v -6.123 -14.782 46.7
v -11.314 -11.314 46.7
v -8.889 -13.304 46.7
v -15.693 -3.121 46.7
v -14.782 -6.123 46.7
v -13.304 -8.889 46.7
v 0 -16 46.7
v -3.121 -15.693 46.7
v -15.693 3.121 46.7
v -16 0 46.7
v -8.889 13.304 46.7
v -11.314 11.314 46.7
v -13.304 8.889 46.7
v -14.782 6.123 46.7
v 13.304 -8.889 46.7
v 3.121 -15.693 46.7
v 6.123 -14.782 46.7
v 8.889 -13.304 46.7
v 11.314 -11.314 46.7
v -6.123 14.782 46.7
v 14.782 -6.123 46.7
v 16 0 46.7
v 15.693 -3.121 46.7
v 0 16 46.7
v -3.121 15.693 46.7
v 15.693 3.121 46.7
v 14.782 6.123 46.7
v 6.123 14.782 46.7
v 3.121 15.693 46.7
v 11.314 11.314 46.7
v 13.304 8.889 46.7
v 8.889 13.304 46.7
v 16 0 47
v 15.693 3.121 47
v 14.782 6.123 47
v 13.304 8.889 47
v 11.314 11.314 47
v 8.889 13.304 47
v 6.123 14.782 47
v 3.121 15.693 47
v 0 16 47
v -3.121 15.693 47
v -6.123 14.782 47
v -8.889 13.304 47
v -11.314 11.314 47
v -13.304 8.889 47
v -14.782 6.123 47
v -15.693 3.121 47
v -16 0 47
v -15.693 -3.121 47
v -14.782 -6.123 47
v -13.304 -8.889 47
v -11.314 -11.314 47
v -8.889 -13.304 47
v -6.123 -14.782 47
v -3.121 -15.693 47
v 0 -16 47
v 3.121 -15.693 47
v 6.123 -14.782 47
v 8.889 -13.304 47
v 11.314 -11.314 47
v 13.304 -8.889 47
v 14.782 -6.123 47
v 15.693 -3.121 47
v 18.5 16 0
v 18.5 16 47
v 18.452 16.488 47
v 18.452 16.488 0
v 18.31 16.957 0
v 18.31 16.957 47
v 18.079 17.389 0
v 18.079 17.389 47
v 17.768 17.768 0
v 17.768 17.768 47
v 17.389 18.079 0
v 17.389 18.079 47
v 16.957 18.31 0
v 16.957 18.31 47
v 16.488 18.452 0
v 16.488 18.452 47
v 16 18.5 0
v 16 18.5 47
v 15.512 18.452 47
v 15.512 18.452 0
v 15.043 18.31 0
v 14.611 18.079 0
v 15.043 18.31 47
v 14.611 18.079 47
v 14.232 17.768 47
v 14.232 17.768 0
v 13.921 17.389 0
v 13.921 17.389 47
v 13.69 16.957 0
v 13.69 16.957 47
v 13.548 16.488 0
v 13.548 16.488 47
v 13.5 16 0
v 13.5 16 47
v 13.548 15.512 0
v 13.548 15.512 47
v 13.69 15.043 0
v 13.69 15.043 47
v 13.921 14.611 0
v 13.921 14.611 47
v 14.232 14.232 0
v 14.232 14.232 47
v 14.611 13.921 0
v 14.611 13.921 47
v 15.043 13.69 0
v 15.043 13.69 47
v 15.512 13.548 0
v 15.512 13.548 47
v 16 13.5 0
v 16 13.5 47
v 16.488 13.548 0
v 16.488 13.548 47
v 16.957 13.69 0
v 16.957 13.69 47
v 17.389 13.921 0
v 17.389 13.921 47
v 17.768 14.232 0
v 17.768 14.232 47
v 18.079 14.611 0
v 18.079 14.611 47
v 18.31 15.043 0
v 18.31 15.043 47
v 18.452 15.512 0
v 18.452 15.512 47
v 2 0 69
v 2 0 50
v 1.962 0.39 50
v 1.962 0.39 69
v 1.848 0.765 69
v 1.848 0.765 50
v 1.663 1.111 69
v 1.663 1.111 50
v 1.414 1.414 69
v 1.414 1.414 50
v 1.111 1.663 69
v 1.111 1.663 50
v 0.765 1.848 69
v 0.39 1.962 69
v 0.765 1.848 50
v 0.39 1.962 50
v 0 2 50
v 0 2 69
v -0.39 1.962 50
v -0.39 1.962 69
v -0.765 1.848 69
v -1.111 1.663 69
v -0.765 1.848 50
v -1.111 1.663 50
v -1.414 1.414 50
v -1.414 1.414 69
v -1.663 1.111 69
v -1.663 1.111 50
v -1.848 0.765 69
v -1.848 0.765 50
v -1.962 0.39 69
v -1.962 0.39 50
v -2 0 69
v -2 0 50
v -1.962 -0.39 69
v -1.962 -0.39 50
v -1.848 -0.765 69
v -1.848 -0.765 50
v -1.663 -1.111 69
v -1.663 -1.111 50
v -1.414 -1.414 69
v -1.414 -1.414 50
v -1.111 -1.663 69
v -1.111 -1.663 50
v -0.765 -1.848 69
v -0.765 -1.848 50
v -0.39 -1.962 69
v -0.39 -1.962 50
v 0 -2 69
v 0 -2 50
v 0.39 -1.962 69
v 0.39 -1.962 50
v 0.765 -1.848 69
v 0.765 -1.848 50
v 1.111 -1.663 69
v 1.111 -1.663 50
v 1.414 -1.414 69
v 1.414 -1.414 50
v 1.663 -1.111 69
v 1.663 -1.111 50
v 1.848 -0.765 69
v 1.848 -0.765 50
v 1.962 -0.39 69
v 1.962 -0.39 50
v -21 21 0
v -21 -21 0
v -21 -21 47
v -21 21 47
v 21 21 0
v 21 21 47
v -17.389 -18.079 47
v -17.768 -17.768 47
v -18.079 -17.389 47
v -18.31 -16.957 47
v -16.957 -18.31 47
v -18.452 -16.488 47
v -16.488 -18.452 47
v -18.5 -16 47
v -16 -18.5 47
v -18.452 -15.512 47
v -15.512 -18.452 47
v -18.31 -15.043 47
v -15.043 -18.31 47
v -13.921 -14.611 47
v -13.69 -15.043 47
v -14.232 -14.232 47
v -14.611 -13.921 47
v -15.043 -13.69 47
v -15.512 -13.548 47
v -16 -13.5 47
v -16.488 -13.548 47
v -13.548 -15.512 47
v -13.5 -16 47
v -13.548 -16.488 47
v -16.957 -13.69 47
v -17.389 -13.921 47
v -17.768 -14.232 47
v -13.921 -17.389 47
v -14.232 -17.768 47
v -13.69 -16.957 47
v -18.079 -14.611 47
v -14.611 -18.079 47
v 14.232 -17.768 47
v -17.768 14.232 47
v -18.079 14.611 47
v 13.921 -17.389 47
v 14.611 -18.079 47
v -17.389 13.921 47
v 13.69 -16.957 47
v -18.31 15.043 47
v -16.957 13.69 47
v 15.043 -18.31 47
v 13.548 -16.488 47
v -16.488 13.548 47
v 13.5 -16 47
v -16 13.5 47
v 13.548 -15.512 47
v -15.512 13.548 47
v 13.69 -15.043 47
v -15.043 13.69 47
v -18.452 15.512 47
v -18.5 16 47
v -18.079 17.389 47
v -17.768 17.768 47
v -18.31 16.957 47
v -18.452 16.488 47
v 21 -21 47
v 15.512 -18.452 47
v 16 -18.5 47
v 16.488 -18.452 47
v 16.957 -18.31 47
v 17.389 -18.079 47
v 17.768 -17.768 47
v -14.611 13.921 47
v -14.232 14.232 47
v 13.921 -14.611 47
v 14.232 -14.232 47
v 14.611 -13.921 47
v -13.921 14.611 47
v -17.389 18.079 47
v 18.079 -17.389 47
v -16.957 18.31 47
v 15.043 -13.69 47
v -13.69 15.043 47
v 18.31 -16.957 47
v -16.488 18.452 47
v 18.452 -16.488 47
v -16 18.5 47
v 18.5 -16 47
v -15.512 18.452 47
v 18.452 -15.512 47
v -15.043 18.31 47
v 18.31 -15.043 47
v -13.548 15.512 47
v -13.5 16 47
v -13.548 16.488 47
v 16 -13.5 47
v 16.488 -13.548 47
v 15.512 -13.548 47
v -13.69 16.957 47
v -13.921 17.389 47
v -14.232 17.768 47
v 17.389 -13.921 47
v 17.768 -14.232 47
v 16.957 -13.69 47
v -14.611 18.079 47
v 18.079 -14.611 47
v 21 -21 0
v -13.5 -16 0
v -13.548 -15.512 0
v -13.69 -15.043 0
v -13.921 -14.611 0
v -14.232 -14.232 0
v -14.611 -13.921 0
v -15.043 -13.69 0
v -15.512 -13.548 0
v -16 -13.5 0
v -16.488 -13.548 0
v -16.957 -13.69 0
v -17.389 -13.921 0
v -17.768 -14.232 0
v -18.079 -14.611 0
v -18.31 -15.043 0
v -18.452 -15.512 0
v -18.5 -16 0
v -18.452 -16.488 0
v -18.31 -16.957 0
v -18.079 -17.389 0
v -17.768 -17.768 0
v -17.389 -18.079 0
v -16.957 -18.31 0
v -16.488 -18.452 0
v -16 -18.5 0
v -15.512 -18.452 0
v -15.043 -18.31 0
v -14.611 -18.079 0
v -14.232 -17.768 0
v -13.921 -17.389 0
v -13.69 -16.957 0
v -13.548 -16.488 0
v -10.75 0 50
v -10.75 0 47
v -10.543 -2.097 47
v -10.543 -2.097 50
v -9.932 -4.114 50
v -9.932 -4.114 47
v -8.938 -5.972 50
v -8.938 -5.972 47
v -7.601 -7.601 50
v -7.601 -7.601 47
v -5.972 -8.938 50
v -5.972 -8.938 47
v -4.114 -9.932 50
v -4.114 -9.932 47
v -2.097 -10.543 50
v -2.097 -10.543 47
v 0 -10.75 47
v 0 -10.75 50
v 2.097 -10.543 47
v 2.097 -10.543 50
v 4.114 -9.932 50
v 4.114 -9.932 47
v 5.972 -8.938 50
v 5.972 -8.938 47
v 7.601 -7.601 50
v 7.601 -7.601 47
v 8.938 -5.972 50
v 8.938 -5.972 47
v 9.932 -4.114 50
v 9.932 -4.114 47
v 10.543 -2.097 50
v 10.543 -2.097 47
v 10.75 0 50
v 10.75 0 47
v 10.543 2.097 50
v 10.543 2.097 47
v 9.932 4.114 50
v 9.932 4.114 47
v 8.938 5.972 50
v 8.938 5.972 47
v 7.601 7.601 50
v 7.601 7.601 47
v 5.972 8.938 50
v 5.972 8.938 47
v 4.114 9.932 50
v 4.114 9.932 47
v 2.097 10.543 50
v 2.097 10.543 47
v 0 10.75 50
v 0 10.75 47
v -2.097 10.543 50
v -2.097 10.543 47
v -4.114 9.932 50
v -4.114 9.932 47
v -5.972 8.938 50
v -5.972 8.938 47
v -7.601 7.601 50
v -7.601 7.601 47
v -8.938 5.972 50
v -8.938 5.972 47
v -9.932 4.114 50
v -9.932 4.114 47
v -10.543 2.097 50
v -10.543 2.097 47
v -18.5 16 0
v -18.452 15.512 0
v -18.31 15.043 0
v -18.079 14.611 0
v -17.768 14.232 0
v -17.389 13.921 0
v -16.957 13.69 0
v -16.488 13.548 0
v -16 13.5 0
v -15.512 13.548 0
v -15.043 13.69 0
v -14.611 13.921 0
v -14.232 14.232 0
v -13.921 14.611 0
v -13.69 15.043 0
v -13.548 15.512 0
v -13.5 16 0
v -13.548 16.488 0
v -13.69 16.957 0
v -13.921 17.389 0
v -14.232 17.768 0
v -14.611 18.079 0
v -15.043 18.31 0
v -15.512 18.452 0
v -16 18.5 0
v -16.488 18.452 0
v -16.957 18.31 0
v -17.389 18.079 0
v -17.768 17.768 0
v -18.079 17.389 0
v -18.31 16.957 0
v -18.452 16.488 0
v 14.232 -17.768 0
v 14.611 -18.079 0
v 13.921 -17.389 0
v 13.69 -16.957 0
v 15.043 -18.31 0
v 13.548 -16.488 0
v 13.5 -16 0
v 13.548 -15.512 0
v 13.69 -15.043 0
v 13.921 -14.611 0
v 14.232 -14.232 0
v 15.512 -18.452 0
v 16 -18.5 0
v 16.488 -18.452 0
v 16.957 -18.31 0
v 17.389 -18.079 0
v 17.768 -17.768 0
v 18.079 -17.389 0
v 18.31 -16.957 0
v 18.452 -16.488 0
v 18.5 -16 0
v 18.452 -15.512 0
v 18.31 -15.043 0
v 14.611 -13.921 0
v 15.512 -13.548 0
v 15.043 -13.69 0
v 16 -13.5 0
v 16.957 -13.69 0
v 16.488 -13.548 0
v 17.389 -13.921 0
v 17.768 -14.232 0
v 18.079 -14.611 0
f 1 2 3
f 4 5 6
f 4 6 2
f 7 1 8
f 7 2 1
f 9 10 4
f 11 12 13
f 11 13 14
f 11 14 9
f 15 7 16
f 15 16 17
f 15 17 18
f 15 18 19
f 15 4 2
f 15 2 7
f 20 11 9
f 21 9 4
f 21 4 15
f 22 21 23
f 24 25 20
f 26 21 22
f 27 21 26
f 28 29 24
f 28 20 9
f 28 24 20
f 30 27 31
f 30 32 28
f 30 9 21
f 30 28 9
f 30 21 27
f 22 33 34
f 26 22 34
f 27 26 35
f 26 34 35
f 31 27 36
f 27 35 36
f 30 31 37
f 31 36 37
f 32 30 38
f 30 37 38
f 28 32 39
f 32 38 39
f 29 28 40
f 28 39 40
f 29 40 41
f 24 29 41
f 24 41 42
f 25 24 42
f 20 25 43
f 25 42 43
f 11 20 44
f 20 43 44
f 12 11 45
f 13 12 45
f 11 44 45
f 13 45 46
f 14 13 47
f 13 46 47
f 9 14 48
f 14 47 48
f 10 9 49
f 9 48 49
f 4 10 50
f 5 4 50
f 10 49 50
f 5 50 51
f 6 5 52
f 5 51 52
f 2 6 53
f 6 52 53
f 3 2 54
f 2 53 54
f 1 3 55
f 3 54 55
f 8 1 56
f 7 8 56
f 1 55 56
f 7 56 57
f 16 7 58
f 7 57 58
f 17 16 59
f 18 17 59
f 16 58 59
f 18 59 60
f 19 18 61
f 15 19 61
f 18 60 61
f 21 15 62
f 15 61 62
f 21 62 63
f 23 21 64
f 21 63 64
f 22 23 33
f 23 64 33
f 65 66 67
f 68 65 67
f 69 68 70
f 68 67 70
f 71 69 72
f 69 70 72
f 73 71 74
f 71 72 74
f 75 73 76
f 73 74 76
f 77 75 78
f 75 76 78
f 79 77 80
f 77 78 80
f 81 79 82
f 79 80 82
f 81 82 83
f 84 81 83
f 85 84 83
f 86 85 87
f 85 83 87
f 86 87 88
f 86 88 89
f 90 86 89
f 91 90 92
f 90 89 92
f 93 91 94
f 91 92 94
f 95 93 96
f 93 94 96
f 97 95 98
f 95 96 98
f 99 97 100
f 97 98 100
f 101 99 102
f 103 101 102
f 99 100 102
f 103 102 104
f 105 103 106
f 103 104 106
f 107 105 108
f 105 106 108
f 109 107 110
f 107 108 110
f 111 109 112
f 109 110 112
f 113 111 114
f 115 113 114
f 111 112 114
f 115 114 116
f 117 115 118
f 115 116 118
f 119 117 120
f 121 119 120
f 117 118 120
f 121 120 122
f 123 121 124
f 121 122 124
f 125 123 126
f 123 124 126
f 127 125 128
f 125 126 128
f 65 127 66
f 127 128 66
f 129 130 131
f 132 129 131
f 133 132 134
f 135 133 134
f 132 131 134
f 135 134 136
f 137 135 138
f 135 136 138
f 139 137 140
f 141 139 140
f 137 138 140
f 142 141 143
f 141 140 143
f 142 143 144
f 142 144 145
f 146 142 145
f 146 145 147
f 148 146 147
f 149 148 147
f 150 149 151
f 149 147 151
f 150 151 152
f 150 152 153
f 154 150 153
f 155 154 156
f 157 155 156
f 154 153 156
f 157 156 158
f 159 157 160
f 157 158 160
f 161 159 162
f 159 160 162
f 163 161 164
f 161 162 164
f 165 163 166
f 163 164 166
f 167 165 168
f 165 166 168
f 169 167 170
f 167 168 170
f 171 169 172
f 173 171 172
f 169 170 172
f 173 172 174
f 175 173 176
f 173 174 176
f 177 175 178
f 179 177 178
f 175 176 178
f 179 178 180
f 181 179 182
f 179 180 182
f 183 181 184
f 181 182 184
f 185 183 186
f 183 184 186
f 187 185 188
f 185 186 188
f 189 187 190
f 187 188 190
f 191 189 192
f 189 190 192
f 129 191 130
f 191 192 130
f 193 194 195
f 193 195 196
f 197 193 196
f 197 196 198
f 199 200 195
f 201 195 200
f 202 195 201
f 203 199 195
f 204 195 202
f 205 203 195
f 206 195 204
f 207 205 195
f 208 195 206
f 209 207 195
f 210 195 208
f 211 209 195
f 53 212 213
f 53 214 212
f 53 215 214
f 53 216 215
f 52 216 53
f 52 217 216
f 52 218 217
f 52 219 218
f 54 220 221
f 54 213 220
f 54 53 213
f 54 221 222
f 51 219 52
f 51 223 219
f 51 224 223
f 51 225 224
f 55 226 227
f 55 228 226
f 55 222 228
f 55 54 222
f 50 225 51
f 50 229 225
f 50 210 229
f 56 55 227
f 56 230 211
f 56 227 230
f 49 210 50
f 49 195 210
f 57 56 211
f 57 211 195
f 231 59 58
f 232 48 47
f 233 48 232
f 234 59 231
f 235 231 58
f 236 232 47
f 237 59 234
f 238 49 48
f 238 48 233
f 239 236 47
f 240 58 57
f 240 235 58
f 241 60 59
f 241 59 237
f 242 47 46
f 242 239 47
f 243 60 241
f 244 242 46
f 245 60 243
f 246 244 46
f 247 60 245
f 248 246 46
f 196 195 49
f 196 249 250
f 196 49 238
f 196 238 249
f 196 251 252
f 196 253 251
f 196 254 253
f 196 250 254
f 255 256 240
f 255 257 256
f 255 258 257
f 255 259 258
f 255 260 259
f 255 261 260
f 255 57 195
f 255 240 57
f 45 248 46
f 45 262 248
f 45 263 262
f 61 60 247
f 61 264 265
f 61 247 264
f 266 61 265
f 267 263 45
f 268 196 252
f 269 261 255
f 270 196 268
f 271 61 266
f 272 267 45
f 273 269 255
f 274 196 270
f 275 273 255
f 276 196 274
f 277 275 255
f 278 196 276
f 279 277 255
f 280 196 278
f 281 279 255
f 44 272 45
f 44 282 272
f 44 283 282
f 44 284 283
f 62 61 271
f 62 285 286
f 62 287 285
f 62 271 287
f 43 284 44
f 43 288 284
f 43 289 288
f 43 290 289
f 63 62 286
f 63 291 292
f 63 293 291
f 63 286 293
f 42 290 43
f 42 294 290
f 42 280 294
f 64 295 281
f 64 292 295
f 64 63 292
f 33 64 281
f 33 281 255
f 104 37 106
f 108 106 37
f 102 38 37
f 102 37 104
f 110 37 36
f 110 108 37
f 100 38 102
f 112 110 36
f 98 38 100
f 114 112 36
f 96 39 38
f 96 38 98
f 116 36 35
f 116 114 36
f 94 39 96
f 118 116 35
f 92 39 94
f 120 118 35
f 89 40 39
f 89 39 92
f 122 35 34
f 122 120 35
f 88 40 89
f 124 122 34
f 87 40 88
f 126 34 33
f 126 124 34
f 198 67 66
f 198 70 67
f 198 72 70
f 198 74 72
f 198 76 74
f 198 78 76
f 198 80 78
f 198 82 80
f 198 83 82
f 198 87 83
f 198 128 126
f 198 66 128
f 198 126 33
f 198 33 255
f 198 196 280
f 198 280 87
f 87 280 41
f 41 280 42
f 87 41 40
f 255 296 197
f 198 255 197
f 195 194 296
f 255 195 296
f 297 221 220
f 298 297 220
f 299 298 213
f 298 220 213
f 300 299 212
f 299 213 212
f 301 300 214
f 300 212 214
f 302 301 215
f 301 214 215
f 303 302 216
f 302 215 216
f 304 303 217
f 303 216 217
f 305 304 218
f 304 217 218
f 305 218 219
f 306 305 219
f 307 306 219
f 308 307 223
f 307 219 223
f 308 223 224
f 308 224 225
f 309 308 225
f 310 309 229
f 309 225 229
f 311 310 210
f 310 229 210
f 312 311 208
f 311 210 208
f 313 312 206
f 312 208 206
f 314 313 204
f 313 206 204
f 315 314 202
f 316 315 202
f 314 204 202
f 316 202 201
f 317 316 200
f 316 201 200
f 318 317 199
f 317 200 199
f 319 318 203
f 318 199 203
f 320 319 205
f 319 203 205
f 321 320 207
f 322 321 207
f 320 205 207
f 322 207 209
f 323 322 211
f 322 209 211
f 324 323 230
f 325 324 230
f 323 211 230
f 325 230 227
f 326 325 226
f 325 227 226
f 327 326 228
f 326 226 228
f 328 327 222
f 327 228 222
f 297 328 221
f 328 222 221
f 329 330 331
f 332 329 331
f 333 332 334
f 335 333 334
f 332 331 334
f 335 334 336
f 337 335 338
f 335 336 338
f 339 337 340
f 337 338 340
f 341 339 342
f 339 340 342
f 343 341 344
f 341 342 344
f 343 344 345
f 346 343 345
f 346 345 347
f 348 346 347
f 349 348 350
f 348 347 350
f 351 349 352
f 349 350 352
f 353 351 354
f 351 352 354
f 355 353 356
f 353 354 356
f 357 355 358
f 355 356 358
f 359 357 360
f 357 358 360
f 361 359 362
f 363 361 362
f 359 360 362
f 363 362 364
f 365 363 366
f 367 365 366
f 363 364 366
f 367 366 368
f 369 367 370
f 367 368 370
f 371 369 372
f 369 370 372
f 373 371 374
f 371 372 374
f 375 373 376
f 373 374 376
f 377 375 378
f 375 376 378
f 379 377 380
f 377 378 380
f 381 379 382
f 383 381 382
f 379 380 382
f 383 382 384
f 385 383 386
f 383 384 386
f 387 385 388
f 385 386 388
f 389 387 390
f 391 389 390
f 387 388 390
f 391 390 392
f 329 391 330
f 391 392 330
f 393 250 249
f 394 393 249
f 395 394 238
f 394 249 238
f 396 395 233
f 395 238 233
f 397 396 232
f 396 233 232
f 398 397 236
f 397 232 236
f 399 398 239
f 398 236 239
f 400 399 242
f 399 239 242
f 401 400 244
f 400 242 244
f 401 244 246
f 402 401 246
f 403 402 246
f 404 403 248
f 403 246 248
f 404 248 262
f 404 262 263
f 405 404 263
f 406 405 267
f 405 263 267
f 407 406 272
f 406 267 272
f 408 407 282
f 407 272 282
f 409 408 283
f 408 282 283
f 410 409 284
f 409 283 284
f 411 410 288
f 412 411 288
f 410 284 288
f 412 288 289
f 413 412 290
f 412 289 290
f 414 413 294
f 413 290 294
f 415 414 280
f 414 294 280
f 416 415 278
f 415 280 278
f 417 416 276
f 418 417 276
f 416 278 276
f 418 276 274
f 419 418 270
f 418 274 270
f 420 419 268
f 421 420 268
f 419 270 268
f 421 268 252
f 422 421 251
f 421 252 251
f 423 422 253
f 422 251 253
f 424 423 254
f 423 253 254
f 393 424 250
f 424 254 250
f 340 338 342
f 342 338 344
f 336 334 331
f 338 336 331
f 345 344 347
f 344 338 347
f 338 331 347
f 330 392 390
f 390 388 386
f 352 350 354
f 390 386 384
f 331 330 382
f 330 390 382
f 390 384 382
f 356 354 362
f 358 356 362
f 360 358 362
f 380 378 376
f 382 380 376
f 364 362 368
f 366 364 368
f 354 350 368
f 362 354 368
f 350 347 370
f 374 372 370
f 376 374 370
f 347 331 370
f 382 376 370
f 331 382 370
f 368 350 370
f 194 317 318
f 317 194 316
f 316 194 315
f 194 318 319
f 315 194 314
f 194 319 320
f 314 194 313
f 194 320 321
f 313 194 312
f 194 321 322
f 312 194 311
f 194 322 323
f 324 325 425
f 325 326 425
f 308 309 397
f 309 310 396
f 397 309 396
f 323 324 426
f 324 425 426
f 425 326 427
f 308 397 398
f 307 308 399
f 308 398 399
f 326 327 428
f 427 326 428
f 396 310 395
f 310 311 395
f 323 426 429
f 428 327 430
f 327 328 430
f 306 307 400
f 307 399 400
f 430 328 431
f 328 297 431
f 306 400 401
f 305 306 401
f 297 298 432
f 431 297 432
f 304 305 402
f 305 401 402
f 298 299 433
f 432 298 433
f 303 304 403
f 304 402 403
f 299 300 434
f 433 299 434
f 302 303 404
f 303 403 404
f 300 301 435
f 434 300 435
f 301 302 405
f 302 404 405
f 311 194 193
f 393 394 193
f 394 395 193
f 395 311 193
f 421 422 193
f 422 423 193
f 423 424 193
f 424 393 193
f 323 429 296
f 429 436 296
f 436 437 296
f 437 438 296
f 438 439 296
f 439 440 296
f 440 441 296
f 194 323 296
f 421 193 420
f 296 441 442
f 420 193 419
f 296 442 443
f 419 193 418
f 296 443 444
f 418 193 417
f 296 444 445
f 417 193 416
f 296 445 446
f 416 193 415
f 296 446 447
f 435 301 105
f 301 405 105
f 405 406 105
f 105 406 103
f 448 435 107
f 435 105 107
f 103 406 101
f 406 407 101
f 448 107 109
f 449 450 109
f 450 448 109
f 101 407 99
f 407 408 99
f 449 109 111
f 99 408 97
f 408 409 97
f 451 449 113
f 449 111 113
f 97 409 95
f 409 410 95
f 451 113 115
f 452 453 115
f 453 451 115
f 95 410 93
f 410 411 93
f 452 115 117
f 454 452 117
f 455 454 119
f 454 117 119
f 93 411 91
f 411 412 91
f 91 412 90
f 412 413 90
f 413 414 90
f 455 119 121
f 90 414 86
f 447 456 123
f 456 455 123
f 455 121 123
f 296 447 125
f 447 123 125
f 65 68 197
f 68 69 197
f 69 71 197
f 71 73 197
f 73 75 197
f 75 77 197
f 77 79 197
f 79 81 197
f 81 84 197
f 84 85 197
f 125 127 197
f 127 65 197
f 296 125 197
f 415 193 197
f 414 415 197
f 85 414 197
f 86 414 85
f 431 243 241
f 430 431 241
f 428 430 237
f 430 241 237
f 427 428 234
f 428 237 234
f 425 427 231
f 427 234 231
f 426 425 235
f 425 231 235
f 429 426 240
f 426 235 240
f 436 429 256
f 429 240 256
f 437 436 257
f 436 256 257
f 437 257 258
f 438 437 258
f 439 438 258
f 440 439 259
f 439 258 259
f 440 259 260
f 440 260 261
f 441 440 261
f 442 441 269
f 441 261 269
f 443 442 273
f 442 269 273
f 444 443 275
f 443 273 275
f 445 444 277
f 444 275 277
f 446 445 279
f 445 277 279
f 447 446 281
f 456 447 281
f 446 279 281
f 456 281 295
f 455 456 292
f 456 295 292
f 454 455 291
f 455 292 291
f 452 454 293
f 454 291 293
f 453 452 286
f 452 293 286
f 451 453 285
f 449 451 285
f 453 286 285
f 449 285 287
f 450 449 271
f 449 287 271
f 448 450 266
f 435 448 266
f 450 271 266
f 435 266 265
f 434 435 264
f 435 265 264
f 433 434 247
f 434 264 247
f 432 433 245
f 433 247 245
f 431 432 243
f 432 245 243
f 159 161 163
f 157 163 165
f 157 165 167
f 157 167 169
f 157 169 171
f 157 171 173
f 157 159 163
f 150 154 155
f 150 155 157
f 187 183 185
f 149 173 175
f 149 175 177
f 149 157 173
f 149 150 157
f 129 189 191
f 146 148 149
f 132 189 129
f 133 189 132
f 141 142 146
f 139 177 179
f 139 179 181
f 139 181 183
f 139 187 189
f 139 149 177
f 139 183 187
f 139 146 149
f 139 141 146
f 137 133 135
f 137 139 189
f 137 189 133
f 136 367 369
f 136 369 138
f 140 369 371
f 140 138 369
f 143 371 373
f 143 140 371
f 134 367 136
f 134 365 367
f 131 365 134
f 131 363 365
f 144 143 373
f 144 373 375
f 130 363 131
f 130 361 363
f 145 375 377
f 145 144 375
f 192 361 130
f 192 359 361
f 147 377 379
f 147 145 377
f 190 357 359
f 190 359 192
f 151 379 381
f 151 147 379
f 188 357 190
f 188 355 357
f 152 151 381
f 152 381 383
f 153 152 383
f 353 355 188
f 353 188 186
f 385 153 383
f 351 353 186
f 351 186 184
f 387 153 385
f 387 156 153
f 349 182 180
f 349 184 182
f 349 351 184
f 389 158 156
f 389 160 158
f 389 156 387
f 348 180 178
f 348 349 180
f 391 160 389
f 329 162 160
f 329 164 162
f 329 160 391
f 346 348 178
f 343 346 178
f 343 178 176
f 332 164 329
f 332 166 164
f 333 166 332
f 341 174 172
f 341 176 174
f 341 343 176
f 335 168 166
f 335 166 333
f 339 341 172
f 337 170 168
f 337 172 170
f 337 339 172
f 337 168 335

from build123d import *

# Parameters (mm, degrees)
SKETCH1_W           = 42
SKETCH1_H           = 42
BOSS_EXTRUDE1_DEPTH = 47
SKETCH2_R           = 2.5
CUT_EXTRUDE1_DEPTH  = 47
SKETCH13_R          = 10.75
BOSS_EXTRUDE5_DEPTH = 3
SKETCH12_R          = 16
CUT_EXTRUDE2_DEPTH  = 0.3
SKETCH14_R          = 2
BOSS_EXTRUDE6_DEPTH = 19


with BuildPart() as part:
    # Sketch1 → Boss-Extrude1 (new body)
    with BuildSketch(Plane.XY):
        Rectangle(SKETCH1_W, SKETCH1_H)
    extrude(amount=BOSS_EXTRUDE1_DEPTH)

    # Sketch2 → Cut-Extrude1 (cut)
    with BuildSketch(Plane.XY.offset(47)):
        with Locations((16, 16)):
            Circle(SKETCH2_R)
        with Locations(Location((-16, 16, 0), (0, 0, 180))):
            Circle(SKETCH2_R)
        with Locations(Location((16, -16, 0), (0, 0, 180))):
            Circle(SKETCH2_R)
        with Locations((-16, -16)):
            Circle(SKETCH2_R)
    extrude(amount=-CUT_EXTRUDE1_DEPTH, mode=Mode.SUBTRACT)

    # Sketch13 → Boss-Extrude5 (add)
    with BuildSketch(Plane.XY.offset(47)):
        with Locations(Location((0, 0, 0), (0, 0, 180))):
            Circle(SKETCH13_R)
    extrude(amount=BOSS_EXTRUDE5_DEPTH)

    # Sketch12 → Cut-Extrude2 (cut)
    with BuildSketch(Plane.XY.offset(47)):
        Circle(SKETCH12_R)
    extrude(amount=-CUT_EXTRUDE2_DEPTH, mode=Mode.SUBTRACT)


with BuildPart() as cut_extrude2_piece_1:
    # of the separate pieces the step leaves, piece 1, a body of its own (cut_extrude2_pieces)
    add(part.part.solids().sort_by_distance((-21, -21, 0))[0])


with BuildPart() as cut_extrude2_piece_2:
    # of the separate pieces the step leaves, piece 2, a body of its own (cut_extrude2_pieces)
    add(part.part.solids().sort_by_distance((-10.75, 0, 47))[0])

    # Sketch14 → Boss-Extrude6 (add)
    with BuildSketch(Plane.XY.offset(50)):
        Circle(SKETCH14_R)
    extrude(amount=BOSS_EXTRUDE6_DEPTH)


solid = Compound([cut_extrude2_piece_1.part, cut_extrude2_piece_2.part])
